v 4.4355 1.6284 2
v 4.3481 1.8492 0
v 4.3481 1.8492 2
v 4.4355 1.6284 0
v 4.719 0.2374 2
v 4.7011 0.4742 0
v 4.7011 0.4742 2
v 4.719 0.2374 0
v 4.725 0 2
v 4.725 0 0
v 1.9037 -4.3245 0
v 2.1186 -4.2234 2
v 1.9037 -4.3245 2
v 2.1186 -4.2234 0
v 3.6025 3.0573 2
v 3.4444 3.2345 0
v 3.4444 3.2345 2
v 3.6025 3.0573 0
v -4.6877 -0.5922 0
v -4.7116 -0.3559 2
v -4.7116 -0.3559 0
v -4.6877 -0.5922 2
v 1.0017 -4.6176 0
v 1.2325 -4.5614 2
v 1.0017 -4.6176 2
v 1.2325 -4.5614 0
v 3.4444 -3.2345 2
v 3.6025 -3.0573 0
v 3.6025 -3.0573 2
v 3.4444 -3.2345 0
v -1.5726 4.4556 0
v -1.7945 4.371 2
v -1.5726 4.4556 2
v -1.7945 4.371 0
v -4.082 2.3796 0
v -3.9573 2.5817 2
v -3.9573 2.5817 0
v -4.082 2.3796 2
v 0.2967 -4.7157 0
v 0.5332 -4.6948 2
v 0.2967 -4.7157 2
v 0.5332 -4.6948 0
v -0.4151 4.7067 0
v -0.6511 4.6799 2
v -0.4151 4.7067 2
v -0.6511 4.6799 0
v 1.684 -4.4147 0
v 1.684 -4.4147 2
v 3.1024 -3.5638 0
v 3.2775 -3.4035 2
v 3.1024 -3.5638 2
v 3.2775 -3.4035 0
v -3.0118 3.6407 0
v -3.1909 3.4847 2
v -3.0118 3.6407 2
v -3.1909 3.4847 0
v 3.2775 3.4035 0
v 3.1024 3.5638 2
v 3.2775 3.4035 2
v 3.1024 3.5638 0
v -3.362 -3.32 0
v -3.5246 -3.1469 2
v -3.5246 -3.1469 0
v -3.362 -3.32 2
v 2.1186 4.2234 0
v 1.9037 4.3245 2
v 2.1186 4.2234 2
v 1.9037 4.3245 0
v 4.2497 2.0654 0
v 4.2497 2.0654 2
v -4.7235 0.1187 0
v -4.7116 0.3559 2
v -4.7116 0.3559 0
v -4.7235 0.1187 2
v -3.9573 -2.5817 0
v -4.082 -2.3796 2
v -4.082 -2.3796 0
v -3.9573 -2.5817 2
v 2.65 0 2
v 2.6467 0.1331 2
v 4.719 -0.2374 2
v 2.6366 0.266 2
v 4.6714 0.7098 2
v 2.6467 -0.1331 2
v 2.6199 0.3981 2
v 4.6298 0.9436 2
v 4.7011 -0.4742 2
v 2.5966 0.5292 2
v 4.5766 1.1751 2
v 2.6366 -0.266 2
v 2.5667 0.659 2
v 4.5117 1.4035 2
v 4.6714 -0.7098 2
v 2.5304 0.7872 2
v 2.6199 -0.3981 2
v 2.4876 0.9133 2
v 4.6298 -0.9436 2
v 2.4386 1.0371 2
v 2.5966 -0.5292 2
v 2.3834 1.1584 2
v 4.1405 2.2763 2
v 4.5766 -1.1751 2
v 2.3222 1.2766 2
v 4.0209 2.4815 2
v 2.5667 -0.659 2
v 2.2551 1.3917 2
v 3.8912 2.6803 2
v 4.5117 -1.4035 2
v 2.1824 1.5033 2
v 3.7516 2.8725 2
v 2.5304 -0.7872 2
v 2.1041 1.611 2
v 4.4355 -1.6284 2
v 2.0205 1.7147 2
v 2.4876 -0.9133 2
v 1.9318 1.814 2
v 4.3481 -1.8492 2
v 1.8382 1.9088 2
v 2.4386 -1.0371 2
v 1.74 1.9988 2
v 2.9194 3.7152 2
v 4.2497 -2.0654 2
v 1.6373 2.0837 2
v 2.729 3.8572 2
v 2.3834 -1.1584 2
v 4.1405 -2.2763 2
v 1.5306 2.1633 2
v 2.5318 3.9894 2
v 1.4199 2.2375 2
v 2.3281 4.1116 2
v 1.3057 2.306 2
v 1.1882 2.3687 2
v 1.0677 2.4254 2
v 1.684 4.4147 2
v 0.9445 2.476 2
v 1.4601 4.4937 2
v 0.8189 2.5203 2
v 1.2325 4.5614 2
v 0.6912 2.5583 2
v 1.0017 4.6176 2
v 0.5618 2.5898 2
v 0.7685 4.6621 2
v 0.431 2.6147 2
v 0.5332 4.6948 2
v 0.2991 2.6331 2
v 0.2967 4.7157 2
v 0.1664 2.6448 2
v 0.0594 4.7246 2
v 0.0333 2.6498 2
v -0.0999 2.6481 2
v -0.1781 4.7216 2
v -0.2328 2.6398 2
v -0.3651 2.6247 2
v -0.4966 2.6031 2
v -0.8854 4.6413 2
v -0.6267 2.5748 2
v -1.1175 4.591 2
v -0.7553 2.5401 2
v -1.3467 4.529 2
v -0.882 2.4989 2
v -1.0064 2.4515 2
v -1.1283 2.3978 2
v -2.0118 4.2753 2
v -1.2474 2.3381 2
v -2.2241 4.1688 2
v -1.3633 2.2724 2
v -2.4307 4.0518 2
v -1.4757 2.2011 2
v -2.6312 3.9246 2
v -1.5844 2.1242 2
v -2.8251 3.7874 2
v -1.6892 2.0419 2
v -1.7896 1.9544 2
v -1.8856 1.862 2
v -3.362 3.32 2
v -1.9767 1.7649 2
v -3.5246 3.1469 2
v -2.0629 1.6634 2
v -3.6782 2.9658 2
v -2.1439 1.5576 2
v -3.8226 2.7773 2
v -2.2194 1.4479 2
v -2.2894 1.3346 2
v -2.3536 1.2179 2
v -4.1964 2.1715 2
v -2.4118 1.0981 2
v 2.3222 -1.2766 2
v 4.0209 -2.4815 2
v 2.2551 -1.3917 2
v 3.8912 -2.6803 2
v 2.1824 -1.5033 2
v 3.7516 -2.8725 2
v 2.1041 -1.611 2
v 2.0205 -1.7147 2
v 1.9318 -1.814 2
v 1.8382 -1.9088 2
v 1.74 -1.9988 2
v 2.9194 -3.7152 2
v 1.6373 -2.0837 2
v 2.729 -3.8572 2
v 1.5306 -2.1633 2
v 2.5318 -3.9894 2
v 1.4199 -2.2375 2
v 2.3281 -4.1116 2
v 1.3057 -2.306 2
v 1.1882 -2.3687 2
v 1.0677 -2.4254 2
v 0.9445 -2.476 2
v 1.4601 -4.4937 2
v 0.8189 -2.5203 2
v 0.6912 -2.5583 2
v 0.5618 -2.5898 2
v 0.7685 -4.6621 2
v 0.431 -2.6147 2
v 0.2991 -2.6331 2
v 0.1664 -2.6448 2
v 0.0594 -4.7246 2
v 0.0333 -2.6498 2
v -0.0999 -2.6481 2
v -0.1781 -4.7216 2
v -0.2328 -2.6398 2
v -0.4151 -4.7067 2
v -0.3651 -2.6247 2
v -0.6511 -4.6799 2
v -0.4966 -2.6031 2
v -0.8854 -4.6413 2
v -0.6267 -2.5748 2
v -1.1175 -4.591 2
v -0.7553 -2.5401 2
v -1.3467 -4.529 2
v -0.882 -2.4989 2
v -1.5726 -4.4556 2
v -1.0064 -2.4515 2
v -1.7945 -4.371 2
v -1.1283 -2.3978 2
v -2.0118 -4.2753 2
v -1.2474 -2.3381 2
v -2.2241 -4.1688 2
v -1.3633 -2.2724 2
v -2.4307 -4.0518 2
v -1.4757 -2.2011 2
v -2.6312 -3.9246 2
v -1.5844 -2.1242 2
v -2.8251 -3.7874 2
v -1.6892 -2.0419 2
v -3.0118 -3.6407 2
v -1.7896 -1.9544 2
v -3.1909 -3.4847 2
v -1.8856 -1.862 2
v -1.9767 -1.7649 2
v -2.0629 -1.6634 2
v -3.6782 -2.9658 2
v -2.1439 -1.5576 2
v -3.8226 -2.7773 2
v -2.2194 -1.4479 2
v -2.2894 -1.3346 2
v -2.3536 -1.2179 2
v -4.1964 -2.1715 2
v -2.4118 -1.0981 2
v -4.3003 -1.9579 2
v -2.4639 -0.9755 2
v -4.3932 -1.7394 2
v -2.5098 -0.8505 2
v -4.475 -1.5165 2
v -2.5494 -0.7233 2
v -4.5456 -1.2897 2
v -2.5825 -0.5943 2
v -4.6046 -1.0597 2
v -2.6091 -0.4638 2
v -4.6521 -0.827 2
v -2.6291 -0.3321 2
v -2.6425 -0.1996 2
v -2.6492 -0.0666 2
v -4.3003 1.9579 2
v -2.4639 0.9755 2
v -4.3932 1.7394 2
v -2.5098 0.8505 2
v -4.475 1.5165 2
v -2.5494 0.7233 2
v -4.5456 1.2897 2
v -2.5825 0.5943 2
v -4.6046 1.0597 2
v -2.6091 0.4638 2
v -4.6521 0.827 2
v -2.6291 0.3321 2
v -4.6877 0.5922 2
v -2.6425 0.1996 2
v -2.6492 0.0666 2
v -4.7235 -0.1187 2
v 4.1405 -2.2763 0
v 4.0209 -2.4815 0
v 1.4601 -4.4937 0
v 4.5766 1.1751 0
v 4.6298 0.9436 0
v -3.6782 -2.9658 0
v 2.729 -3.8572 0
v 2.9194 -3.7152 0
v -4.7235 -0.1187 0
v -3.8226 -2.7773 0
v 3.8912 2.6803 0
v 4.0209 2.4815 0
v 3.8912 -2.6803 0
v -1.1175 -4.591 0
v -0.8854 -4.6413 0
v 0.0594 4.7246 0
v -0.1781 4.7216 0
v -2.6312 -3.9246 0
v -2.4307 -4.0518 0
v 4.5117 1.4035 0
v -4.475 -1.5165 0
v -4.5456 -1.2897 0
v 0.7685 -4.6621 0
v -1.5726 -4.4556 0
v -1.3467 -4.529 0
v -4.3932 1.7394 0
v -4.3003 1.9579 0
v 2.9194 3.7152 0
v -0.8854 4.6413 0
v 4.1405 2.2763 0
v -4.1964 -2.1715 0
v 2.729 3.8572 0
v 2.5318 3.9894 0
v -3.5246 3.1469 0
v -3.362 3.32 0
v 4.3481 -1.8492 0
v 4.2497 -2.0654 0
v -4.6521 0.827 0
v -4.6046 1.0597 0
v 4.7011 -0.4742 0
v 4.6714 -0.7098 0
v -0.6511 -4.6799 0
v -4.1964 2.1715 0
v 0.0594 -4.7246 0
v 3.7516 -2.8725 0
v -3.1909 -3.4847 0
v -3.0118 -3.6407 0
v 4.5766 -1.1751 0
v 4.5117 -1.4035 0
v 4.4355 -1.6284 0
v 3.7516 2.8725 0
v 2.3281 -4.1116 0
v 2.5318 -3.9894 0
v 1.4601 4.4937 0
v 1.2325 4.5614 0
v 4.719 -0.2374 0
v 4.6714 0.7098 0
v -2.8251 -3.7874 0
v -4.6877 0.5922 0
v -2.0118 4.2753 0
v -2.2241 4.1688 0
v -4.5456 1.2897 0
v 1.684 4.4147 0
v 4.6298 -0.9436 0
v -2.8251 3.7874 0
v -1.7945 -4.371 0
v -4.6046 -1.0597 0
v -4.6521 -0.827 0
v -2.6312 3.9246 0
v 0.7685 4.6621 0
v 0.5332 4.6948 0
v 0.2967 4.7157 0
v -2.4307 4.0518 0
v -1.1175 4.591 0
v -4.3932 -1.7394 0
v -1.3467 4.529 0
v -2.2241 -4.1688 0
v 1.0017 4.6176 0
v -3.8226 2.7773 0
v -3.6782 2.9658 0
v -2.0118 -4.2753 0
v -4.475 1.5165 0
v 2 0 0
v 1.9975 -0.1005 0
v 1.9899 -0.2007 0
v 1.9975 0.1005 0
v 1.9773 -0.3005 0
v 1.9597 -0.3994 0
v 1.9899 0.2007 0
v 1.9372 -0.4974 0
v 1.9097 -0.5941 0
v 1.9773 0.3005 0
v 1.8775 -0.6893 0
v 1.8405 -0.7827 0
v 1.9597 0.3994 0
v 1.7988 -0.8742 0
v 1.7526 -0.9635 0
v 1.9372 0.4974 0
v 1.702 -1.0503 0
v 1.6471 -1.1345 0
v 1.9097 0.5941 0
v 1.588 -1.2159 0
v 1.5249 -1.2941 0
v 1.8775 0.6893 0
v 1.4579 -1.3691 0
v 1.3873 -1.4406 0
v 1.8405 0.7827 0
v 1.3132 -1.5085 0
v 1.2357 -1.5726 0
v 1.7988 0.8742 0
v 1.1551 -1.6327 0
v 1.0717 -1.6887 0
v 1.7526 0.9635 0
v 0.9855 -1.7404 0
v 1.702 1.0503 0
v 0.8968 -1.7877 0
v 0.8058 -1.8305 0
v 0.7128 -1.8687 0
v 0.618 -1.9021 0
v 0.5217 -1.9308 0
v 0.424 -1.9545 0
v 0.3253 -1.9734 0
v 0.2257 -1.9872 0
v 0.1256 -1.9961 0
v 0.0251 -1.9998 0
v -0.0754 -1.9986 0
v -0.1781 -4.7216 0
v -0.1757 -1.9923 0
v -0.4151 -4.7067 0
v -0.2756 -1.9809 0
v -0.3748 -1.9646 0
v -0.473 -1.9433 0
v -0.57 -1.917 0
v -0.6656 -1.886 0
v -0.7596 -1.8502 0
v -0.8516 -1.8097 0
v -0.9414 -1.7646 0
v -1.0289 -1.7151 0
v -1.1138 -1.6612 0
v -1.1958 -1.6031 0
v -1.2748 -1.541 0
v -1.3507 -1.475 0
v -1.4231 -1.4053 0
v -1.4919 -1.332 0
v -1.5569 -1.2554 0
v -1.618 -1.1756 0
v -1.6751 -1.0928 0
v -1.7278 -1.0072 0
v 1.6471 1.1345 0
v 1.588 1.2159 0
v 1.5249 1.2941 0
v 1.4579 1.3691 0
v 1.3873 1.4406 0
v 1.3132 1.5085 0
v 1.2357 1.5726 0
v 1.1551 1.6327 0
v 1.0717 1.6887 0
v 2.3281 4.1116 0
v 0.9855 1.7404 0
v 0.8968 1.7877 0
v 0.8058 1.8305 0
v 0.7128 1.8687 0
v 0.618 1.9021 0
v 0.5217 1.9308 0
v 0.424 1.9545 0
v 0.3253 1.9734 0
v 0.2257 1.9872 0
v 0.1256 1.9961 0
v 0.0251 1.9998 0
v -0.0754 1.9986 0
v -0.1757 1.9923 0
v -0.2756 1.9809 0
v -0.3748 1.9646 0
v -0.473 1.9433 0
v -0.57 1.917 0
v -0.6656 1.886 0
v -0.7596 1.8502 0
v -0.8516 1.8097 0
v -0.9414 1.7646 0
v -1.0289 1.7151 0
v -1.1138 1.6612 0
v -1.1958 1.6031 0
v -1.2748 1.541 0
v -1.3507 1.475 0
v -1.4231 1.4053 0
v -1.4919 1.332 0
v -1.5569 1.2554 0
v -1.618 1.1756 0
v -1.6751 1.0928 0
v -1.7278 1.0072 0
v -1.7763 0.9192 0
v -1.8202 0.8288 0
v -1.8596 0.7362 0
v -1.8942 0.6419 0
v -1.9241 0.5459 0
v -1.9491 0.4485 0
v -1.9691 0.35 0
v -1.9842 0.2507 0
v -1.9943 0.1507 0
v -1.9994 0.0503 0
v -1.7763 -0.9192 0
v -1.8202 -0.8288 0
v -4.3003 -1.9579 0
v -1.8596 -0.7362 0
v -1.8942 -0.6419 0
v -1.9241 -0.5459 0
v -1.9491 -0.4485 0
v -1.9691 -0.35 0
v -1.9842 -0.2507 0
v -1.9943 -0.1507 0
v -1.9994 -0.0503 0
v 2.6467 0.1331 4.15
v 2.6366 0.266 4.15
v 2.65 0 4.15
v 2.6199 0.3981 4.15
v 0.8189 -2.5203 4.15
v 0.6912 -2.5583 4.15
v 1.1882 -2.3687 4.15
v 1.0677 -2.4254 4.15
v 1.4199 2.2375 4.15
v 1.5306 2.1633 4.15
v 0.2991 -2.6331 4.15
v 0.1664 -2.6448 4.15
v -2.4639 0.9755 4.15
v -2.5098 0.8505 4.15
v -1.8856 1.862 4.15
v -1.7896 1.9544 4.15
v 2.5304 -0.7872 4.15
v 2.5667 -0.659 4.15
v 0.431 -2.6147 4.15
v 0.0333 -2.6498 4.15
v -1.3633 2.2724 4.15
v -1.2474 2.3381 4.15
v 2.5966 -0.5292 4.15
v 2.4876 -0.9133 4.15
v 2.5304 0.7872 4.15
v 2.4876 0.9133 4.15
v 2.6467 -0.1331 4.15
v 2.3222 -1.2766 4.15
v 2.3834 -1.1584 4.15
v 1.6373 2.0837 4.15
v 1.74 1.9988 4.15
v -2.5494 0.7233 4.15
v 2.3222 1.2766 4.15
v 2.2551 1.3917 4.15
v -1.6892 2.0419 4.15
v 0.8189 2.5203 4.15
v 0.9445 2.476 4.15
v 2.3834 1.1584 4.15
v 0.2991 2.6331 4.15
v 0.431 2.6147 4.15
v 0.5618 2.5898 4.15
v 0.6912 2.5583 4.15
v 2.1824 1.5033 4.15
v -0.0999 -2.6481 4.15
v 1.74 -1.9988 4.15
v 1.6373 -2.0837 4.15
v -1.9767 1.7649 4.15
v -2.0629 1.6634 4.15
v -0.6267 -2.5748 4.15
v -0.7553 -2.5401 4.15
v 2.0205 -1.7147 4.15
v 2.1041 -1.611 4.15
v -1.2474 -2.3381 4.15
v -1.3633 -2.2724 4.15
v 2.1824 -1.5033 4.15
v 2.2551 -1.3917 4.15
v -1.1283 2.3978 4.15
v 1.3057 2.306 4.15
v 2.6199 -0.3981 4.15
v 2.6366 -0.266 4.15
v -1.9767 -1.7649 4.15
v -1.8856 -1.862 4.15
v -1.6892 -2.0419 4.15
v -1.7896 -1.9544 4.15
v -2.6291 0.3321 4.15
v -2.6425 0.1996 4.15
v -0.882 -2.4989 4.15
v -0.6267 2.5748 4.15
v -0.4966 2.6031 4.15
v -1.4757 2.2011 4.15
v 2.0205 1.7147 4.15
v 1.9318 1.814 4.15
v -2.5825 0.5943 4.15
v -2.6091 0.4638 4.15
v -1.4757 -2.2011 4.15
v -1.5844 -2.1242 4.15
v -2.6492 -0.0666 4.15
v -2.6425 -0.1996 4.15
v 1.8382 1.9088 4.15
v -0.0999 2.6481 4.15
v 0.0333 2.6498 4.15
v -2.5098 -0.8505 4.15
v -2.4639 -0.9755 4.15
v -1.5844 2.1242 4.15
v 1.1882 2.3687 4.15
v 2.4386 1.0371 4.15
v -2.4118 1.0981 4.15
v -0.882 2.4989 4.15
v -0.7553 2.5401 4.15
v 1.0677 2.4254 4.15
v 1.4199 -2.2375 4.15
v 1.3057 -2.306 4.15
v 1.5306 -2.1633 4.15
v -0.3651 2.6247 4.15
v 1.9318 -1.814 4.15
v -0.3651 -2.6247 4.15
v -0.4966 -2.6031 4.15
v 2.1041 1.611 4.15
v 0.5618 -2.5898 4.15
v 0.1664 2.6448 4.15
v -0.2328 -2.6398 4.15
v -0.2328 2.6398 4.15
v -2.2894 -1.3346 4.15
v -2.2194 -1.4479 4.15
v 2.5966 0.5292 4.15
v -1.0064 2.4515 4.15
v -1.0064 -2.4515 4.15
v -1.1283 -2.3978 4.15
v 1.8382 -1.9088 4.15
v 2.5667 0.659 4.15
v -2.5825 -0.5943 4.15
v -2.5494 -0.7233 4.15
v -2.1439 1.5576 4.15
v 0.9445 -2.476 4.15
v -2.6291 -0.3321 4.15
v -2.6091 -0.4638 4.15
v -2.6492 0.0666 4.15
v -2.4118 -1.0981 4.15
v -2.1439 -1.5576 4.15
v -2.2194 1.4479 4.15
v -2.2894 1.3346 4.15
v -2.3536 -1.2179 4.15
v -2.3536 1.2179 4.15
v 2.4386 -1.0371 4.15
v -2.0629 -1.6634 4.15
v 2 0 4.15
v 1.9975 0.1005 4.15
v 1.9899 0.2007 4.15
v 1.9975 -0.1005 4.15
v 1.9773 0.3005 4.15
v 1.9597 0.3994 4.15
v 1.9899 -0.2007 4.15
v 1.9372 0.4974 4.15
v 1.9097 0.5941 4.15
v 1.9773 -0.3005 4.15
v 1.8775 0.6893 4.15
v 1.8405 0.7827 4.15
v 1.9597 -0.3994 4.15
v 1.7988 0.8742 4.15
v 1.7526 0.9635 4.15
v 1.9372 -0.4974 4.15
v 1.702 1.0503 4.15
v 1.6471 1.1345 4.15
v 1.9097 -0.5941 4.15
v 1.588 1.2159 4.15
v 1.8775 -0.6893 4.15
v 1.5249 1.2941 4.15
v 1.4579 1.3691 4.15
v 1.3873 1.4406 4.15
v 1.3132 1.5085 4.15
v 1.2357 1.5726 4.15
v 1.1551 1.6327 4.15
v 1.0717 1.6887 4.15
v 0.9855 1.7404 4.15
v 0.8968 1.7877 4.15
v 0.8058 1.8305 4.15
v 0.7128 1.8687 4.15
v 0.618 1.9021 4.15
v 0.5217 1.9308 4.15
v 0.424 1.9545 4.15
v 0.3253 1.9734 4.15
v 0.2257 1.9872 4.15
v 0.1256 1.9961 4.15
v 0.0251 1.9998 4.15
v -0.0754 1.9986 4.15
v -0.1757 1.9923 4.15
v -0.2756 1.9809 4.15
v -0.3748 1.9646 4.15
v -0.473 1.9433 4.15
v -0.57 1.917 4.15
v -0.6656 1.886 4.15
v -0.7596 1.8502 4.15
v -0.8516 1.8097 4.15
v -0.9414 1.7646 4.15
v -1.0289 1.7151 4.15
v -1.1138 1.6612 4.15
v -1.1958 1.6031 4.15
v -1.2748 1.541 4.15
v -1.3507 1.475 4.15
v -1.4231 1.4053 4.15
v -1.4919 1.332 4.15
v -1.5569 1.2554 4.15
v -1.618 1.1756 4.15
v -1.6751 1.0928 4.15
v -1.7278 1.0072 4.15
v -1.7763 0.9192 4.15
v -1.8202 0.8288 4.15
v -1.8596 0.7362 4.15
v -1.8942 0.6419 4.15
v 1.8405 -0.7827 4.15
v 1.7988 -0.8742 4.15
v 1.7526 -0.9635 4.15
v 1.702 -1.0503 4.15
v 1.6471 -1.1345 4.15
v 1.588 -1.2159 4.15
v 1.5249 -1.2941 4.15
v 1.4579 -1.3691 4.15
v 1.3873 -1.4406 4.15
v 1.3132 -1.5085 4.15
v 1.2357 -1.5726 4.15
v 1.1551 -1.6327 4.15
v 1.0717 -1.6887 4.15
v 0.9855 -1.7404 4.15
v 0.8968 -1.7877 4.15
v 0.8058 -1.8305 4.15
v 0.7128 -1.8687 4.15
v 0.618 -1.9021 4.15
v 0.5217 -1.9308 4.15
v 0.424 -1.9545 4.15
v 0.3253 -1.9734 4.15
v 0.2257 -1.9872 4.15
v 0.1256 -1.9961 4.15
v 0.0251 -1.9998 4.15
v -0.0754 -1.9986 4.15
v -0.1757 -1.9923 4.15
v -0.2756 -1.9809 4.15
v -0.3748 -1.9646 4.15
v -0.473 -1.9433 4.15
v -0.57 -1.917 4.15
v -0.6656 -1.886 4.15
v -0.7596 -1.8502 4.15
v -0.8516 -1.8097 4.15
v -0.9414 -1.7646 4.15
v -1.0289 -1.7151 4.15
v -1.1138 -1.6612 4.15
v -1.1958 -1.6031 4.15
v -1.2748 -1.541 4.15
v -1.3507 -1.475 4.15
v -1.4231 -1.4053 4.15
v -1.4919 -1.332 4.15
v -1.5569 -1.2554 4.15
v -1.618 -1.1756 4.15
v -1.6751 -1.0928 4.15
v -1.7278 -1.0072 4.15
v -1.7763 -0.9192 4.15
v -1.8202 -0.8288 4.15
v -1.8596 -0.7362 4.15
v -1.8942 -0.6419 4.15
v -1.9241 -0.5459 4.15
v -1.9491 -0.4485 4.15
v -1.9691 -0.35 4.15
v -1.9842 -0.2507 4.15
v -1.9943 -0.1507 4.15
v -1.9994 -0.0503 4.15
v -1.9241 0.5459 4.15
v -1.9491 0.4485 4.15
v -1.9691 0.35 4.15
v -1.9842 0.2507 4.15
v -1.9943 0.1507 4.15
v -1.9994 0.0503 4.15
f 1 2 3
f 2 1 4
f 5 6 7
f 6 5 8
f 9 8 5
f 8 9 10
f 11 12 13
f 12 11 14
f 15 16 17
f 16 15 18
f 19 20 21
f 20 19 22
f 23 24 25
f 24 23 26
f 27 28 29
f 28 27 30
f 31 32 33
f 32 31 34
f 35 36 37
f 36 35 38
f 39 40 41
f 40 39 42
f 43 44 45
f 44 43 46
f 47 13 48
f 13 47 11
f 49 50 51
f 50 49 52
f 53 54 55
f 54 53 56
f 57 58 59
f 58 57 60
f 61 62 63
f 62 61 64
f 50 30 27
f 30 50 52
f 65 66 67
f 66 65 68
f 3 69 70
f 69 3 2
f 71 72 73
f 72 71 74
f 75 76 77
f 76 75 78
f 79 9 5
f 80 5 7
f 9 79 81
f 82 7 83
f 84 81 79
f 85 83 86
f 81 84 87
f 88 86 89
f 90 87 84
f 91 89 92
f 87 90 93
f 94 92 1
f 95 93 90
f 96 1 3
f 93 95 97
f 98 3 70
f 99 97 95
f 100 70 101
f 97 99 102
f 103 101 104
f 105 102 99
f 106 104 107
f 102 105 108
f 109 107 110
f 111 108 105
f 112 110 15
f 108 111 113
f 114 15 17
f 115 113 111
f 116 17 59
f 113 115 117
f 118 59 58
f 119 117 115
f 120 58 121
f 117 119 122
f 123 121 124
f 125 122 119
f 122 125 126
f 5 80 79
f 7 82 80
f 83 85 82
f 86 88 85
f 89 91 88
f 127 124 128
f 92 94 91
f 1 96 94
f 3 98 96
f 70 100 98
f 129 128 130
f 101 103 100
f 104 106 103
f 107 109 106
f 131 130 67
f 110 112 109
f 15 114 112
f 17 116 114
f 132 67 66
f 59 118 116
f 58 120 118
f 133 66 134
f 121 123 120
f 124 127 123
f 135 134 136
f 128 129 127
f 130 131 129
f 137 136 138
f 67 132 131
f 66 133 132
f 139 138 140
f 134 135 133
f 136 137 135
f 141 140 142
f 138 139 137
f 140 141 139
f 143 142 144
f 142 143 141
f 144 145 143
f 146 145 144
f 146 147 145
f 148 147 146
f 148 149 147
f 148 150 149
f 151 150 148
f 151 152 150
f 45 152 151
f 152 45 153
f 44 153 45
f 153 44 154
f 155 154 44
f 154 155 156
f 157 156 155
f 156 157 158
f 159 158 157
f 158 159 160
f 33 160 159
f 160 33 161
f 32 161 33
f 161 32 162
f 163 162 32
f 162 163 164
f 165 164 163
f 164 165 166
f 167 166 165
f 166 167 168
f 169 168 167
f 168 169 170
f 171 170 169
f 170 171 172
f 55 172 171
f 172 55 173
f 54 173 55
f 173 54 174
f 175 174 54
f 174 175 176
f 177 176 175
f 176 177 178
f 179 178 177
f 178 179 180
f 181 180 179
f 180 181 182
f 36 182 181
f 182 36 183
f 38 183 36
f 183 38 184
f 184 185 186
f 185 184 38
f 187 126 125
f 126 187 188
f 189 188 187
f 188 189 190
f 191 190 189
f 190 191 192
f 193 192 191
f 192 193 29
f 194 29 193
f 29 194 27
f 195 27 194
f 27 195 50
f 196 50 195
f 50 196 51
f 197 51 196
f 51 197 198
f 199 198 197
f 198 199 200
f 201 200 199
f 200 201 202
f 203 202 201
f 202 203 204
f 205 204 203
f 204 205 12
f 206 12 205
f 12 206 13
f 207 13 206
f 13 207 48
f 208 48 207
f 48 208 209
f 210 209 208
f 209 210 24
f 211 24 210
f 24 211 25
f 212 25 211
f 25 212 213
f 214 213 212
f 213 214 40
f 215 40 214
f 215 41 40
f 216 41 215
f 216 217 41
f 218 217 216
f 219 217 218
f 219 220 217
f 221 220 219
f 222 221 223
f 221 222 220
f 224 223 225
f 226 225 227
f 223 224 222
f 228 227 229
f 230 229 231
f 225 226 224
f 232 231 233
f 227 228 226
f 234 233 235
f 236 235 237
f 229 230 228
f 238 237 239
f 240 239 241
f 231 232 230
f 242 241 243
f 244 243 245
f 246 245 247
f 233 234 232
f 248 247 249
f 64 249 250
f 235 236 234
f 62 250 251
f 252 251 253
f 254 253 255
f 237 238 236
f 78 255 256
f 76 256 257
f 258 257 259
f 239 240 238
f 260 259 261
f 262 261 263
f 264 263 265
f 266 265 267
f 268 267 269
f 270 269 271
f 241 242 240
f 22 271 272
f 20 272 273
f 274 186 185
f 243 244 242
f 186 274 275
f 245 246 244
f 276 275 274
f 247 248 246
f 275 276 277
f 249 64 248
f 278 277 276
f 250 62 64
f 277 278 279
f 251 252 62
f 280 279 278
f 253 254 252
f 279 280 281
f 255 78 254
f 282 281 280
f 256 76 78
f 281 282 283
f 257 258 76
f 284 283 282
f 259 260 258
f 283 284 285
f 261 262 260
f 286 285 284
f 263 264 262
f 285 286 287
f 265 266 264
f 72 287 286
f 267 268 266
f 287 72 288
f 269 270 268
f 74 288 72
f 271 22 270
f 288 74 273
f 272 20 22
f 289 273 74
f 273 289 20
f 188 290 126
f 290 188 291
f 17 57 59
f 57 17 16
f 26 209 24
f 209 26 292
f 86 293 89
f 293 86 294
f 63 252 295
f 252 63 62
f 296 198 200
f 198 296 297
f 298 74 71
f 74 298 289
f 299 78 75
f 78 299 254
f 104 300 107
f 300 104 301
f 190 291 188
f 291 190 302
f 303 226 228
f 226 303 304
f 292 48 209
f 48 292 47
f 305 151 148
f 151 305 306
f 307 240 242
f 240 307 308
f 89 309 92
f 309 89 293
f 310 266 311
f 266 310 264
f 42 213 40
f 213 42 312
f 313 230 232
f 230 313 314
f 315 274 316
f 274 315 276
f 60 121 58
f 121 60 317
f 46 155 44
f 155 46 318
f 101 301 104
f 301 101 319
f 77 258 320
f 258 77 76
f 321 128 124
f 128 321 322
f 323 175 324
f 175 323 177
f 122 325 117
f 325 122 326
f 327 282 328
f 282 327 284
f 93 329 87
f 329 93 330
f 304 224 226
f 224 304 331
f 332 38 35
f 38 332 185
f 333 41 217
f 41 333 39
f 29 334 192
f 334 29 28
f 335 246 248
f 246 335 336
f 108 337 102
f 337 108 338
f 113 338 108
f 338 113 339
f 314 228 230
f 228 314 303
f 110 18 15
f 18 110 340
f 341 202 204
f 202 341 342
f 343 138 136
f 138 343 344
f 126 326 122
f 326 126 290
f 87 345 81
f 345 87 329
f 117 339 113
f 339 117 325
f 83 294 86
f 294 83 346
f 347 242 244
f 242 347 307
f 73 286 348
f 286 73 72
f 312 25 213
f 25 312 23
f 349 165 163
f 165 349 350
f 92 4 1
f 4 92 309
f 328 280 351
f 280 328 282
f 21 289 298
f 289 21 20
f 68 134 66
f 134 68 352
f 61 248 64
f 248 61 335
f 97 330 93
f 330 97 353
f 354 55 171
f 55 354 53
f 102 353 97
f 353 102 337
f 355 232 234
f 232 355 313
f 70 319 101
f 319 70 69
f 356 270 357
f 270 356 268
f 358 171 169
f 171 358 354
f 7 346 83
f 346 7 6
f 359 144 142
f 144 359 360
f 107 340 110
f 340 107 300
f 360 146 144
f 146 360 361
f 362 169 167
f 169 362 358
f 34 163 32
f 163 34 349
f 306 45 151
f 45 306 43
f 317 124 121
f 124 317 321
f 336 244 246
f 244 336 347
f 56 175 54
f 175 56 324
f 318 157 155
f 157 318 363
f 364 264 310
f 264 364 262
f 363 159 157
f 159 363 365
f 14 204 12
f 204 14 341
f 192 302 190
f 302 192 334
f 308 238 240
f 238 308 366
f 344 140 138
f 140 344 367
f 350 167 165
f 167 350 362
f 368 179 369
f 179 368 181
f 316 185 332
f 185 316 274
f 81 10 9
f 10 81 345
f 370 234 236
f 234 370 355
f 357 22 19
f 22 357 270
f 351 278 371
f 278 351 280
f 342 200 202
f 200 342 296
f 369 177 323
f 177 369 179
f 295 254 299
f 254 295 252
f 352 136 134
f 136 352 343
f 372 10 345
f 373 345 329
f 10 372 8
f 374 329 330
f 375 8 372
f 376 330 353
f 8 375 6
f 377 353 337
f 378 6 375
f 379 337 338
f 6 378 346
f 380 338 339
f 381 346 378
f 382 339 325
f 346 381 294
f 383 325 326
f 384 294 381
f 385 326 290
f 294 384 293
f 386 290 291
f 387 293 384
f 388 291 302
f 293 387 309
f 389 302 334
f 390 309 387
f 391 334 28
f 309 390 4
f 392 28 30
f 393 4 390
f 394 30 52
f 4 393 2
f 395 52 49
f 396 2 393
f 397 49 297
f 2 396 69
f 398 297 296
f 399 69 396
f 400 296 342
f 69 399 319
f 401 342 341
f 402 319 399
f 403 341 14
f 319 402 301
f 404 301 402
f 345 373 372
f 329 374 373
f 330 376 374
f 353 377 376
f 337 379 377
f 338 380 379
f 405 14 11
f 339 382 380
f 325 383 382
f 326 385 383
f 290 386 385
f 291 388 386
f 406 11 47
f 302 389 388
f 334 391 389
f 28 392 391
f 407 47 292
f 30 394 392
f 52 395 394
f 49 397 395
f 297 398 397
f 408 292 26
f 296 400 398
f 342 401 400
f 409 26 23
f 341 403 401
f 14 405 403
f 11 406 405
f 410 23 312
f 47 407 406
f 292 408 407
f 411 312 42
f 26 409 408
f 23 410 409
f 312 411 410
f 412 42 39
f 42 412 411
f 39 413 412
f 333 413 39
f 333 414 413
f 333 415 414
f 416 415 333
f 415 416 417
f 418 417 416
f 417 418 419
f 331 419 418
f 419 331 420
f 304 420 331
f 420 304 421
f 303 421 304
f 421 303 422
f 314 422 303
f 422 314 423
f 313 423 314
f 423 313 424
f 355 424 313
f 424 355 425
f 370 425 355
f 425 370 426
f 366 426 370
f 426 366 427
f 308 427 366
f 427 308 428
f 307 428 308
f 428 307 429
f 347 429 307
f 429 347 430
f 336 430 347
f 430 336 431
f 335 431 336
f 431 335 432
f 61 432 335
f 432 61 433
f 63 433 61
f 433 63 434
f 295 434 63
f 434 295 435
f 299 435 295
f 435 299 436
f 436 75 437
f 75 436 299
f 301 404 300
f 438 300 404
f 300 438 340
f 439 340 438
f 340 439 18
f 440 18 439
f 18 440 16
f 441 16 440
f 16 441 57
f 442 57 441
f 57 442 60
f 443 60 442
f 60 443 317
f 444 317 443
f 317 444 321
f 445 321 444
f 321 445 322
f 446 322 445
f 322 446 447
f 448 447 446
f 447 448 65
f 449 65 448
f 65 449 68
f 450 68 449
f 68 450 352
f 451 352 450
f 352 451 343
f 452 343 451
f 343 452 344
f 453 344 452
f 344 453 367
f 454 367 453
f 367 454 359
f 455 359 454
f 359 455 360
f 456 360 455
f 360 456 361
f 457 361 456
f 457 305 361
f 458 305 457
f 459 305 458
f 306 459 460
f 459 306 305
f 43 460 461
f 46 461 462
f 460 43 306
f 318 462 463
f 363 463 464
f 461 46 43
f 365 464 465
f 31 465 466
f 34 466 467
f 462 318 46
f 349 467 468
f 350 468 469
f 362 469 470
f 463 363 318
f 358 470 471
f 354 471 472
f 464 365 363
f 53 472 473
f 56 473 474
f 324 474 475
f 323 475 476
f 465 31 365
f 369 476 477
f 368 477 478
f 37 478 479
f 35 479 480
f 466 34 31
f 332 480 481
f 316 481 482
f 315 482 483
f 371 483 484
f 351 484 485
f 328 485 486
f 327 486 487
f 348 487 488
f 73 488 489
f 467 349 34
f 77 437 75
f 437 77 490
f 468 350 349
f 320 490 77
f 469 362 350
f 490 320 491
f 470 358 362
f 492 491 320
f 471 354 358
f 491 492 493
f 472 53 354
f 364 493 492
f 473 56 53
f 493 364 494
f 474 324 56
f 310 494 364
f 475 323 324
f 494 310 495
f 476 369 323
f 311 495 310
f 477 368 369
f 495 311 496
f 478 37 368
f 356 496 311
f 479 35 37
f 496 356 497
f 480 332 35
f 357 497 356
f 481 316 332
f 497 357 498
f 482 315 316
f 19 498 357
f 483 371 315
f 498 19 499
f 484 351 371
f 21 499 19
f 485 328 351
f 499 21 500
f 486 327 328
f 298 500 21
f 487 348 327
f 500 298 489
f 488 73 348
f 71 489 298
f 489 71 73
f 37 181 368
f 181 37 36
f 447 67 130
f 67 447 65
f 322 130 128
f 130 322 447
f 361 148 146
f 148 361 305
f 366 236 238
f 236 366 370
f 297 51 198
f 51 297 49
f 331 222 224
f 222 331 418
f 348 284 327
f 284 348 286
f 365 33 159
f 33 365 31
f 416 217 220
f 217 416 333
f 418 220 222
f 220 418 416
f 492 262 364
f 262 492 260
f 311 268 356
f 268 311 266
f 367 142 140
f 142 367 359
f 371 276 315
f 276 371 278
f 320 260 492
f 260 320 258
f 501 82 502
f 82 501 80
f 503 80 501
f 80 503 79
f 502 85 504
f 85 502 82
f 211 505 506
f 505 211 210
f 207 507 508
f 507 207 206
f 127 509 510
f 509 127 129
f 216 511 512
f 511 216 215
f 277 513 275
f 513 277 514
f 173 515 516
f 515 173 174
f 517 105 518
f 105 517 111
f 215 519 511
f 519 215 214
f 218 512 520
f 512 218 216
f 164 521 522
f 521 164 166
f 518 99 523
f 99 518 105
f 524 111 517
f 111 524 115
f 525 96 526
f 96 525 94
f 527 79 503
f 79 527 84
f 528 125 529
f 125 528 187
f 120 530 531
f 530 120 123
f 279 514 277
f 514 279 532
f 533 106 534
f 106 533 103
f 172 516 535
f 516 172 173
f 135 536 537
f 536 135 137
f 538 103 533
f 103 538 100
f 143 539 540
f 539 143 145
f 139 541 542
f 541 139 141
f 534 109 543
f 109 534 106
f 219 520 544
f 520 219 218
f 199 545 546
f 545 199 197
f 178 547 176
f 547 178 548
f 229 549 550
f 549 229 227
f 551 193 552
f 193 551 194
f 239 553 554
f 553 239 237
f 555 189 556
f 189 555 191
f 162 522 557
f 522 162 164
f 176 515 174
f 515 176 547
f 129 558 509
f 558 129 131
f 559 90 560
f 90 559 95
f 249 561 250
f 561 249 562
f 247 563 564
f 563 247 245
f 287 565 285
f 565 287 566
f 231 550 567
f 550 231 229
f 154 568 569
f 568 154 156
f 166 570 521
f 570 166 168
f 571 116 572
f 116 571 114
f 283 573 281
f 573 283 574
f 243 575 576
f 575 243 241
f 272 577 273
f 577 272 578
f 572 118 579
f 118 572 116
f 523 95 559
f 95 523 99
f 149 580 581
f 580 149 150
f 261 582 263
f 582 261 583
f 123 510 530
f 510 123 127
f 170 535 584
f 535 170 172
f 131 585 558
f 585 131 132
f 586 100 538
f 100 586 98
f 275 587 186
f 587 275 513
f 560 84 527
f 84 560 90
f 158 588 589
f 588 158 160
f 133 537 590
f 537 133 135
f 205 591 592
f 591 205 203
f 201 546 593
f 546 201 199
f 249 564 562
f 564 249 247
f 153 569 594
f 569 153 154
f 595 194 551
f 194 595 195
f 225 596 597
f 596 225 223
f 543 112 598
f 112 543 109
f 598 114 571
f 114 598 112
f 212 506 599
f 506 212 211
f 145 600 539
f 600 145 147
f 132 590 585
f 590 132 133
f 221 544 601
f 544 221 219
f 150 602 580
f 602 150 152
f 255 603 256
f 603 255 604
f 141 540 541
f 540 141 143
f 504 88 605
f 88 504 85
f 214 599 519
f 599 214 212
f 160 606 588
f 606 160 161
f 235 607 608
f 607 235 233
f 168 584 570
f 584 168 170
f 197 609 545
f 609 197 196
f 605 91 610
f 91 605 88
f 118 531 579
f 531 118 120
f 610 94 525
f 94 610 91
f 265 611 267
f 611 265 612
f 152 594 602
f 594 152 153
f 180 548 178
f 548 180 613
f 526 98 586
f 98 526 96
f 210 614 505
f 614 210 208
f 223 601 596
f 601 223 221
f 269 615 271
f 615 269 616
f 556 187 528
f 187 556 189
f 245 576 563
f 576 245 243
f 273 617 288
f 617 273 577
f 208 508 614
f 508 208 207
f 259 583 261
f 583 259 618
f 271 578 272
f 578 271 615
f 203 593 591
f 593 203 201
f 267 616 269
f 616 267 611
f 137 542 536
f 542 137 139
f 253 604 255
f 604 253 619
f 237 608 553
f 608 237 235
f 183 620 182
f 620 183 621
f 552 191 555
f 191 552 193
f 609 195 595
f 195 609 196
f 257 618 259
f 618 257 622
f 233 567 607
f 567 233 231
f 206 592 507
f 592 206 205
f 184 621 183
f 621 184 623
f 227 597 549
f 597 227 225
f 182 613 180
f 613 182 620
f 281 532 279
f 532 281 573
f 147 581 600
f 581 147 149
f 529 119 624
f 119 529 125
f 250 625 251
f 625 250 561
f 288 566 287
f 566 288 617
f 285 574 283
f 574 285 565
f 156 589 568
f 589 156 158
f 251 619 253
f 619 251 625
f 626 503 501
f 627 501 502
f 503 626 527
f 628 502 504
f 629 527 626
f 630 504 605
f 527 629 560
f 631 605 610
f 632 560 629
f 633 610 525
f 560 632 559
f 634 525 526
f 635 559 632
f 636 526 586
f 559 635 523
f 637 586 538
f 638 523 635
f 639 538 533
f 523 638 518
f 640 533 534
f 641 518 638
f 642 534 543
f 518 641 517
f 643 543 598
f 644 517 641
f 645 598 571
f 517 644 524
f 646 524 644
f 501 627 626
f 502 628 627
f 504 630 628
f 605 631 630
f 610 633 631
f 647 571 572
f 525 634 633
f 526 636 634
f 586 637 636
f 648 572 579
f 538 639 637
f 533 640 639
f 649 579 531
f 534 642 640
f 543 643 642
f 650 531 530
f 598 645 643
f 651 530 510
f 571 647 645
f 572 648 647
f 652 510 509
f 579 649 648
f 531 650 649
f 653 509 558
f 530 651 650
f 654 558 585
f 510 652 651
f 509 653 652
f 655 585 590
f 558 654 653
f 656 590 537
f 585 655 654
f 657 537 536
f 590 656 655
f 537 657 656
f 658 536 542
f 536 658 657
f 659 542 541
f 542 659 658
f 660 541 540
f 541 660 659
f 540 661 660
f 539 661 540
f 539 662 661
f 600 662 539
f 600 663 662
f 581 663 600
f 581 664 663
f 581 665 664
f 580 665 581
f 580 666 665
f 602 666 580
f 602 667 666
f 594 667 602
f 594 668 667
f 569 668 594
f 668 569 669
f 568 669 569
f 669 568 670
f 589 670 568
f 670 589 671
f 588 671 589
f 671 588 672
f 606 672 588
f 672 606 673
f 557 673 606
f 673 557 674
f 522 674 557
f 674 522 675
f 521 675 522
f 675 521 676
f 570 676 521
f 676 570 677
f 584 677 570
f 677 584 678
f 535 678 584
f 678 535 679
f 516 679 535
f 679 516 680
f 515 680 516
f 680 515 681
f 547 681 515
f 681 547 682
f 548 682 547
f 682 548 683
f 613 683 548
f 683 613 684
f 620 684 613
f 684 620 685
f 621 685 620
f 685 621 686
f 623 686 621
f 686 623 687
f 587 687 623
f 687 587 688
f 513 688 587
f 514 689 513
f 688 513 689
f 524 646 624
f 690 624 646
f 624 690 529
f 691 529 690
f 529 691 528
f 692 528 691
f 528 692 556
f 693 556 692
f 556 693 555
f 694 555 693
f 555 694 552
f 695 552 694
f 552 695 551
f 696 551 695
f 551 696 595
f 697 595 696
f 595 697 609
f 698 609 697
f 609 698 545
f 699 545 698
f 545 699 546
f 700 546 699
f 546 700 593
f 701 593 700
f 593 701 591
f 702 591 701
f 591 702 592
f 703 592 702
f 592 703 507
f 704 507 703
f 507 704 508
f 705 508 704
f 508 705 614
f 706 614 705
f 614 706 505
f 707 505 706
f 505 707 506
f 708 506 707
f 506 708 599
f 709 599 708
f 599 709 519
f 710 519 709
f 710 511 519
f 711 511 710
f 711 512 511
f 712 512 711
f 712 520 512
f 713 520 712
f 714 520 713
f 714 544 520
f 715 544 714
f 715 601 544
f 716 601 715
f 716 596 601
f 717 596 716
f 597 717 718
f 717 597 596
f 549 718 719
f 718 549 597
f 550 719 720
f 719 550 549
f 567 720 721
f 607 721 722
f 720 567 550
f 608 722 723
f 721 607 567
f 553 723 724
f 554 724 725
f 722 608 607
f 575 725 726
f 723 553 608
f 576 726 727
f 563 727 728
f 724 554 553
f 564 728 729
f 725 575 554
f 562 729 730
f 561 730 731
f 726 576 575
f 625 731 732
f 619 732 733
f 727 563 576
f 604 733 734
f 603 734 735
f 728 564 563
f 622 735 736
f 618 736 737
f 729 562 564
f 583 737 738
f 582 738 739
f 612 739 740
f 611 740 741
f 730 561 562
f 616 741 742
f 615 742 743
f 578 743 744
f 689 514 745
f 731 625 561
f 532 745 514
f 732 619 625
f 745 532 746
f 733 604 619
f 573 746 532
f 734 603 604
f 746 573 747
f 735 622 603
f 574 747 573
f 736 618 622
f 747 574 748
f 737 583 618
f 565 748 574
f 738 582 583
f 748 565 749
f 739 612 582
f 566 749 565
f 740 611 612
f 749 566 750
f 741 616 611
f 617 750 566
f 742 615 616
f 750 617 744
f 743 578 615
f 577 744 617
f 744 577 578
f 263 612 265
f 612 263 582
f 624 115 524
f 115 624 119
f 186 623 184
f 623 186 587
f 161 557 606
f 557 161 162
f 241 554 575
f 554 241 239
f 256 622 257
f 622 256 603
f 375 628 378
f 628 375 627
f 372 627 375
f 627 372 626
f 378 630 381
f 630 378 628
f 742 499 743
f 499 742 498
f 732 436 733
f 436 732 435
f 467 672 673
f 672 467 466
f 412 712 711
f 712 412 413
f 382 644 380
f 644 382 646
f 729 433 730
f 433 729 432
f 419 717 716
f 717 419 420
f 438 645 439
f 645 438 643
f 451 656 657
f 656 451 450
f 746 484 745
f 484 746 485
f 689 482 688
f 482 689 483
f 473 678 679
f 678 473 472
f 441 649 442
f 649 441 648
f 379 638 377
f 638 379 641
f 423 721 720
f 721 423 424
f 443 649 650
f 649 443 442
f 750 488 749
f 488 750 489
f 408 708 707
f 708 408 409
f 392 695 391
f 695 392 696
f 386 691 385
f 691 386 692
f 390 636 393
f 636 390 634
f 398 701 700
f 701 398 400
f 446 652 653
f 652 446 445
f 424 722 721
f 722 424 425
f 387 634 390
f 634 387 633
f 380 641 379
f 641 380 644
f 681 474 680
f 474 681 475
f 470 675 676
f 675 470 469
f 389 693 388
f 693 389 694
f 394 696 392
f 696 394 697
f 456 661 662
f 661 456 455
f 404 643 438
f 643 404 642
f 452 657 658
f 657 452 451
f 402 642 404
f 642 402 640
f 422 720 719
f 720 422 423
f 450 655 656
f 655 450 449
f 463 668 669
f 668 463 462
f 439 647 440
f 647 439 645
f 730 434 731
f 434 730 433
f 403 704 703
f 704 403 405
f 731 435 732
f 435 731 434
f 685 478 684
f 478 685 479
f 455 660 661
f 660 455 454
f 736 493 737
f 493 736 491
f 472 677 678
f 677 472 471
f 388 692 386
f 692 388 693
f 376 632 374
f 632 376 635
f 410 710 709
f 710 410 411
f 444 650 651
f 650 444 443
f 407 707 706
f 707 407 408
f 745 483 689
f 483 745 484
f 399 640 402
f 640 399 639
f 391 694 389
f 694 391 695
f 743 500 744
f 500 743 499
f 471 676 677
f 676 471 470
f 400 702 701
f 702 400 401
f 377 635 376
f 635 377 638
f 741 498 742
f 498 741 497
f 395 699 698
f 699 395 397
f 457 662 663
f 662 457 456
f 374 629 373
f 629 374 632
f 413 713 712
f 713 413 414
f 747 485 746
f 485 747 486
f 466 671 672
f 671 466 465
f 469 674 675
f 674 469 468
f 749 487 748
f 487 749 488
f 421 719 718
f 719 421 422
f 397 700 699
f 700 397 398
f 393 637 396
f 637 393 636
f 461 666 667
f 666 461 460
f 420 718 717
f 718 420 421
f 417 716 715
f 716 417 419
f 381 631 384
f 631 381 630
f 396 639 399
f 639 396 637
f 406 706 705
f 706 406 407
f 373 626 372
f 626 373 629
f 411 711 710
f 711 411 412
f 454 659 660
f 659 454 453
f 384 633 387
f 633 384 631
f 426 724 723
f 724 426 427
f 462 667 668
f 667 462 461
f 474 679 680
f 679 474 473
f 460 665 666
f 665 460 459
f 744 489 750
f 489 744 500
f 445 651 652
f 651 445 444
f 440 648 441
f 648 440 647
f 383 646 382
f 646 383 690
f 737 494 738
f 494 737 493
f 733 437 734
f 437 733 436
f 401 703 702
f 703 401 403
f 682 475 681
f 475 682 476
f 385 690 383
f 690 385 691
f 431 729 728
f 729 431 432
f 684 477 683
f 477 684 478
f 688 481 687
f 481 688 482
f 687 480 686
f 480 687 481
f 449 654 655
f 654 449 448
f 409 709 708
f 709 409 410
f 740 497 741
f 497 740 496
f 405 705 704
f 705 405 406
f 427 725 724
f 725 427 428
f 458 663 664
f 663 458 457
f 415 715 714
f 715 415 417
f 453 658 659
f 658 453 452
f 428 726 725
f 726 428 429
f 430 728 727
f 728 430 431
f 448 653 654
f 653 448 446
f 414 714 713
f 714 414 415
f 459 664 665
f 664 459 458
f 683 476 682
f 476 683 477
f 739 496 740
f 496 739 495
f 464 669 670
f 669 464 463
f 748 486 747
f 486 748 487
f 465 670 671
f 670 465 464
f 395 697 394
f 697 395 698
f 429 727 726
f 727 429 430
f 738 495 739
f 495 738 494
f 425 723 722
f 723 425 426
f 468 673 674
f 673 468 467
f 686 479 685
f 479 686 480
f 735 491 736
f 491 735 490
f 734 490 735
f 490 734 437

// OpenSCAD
// created by IndiePandaaaaa|Lukas 
// encoding: utf-8

// used: ruthex M4S and ruthex M3S

TOLERANCE = .15;
THICKNESS = 2;
$fn = $preview? 25:125;


module MetricInsert(OD, ID, height) {
  difference() {
    union() {
      cylinder(d=OD + THICKNESS*2 + TOLERANCE, h=THICKNESS);
      cylinder(d=OD, h=height + TOLERANCE);
    }
    translate([0, 0, -.1]) cylinder(d=ID, h=height + TOLERANCE + .2);
  }
}

module M3Insert(OD=5) { // used with ruthex M3S
  ID = 4;
  height = 4;

  MetricInsert(OD=OD, ID=ID, height=height);
}

module M4Insert(OD=7) {
  ID = 5.6;
  height = 4;

  MetricInsert(OD=OD, ID=ID, height=height);
}


M3Insert(5.3);
